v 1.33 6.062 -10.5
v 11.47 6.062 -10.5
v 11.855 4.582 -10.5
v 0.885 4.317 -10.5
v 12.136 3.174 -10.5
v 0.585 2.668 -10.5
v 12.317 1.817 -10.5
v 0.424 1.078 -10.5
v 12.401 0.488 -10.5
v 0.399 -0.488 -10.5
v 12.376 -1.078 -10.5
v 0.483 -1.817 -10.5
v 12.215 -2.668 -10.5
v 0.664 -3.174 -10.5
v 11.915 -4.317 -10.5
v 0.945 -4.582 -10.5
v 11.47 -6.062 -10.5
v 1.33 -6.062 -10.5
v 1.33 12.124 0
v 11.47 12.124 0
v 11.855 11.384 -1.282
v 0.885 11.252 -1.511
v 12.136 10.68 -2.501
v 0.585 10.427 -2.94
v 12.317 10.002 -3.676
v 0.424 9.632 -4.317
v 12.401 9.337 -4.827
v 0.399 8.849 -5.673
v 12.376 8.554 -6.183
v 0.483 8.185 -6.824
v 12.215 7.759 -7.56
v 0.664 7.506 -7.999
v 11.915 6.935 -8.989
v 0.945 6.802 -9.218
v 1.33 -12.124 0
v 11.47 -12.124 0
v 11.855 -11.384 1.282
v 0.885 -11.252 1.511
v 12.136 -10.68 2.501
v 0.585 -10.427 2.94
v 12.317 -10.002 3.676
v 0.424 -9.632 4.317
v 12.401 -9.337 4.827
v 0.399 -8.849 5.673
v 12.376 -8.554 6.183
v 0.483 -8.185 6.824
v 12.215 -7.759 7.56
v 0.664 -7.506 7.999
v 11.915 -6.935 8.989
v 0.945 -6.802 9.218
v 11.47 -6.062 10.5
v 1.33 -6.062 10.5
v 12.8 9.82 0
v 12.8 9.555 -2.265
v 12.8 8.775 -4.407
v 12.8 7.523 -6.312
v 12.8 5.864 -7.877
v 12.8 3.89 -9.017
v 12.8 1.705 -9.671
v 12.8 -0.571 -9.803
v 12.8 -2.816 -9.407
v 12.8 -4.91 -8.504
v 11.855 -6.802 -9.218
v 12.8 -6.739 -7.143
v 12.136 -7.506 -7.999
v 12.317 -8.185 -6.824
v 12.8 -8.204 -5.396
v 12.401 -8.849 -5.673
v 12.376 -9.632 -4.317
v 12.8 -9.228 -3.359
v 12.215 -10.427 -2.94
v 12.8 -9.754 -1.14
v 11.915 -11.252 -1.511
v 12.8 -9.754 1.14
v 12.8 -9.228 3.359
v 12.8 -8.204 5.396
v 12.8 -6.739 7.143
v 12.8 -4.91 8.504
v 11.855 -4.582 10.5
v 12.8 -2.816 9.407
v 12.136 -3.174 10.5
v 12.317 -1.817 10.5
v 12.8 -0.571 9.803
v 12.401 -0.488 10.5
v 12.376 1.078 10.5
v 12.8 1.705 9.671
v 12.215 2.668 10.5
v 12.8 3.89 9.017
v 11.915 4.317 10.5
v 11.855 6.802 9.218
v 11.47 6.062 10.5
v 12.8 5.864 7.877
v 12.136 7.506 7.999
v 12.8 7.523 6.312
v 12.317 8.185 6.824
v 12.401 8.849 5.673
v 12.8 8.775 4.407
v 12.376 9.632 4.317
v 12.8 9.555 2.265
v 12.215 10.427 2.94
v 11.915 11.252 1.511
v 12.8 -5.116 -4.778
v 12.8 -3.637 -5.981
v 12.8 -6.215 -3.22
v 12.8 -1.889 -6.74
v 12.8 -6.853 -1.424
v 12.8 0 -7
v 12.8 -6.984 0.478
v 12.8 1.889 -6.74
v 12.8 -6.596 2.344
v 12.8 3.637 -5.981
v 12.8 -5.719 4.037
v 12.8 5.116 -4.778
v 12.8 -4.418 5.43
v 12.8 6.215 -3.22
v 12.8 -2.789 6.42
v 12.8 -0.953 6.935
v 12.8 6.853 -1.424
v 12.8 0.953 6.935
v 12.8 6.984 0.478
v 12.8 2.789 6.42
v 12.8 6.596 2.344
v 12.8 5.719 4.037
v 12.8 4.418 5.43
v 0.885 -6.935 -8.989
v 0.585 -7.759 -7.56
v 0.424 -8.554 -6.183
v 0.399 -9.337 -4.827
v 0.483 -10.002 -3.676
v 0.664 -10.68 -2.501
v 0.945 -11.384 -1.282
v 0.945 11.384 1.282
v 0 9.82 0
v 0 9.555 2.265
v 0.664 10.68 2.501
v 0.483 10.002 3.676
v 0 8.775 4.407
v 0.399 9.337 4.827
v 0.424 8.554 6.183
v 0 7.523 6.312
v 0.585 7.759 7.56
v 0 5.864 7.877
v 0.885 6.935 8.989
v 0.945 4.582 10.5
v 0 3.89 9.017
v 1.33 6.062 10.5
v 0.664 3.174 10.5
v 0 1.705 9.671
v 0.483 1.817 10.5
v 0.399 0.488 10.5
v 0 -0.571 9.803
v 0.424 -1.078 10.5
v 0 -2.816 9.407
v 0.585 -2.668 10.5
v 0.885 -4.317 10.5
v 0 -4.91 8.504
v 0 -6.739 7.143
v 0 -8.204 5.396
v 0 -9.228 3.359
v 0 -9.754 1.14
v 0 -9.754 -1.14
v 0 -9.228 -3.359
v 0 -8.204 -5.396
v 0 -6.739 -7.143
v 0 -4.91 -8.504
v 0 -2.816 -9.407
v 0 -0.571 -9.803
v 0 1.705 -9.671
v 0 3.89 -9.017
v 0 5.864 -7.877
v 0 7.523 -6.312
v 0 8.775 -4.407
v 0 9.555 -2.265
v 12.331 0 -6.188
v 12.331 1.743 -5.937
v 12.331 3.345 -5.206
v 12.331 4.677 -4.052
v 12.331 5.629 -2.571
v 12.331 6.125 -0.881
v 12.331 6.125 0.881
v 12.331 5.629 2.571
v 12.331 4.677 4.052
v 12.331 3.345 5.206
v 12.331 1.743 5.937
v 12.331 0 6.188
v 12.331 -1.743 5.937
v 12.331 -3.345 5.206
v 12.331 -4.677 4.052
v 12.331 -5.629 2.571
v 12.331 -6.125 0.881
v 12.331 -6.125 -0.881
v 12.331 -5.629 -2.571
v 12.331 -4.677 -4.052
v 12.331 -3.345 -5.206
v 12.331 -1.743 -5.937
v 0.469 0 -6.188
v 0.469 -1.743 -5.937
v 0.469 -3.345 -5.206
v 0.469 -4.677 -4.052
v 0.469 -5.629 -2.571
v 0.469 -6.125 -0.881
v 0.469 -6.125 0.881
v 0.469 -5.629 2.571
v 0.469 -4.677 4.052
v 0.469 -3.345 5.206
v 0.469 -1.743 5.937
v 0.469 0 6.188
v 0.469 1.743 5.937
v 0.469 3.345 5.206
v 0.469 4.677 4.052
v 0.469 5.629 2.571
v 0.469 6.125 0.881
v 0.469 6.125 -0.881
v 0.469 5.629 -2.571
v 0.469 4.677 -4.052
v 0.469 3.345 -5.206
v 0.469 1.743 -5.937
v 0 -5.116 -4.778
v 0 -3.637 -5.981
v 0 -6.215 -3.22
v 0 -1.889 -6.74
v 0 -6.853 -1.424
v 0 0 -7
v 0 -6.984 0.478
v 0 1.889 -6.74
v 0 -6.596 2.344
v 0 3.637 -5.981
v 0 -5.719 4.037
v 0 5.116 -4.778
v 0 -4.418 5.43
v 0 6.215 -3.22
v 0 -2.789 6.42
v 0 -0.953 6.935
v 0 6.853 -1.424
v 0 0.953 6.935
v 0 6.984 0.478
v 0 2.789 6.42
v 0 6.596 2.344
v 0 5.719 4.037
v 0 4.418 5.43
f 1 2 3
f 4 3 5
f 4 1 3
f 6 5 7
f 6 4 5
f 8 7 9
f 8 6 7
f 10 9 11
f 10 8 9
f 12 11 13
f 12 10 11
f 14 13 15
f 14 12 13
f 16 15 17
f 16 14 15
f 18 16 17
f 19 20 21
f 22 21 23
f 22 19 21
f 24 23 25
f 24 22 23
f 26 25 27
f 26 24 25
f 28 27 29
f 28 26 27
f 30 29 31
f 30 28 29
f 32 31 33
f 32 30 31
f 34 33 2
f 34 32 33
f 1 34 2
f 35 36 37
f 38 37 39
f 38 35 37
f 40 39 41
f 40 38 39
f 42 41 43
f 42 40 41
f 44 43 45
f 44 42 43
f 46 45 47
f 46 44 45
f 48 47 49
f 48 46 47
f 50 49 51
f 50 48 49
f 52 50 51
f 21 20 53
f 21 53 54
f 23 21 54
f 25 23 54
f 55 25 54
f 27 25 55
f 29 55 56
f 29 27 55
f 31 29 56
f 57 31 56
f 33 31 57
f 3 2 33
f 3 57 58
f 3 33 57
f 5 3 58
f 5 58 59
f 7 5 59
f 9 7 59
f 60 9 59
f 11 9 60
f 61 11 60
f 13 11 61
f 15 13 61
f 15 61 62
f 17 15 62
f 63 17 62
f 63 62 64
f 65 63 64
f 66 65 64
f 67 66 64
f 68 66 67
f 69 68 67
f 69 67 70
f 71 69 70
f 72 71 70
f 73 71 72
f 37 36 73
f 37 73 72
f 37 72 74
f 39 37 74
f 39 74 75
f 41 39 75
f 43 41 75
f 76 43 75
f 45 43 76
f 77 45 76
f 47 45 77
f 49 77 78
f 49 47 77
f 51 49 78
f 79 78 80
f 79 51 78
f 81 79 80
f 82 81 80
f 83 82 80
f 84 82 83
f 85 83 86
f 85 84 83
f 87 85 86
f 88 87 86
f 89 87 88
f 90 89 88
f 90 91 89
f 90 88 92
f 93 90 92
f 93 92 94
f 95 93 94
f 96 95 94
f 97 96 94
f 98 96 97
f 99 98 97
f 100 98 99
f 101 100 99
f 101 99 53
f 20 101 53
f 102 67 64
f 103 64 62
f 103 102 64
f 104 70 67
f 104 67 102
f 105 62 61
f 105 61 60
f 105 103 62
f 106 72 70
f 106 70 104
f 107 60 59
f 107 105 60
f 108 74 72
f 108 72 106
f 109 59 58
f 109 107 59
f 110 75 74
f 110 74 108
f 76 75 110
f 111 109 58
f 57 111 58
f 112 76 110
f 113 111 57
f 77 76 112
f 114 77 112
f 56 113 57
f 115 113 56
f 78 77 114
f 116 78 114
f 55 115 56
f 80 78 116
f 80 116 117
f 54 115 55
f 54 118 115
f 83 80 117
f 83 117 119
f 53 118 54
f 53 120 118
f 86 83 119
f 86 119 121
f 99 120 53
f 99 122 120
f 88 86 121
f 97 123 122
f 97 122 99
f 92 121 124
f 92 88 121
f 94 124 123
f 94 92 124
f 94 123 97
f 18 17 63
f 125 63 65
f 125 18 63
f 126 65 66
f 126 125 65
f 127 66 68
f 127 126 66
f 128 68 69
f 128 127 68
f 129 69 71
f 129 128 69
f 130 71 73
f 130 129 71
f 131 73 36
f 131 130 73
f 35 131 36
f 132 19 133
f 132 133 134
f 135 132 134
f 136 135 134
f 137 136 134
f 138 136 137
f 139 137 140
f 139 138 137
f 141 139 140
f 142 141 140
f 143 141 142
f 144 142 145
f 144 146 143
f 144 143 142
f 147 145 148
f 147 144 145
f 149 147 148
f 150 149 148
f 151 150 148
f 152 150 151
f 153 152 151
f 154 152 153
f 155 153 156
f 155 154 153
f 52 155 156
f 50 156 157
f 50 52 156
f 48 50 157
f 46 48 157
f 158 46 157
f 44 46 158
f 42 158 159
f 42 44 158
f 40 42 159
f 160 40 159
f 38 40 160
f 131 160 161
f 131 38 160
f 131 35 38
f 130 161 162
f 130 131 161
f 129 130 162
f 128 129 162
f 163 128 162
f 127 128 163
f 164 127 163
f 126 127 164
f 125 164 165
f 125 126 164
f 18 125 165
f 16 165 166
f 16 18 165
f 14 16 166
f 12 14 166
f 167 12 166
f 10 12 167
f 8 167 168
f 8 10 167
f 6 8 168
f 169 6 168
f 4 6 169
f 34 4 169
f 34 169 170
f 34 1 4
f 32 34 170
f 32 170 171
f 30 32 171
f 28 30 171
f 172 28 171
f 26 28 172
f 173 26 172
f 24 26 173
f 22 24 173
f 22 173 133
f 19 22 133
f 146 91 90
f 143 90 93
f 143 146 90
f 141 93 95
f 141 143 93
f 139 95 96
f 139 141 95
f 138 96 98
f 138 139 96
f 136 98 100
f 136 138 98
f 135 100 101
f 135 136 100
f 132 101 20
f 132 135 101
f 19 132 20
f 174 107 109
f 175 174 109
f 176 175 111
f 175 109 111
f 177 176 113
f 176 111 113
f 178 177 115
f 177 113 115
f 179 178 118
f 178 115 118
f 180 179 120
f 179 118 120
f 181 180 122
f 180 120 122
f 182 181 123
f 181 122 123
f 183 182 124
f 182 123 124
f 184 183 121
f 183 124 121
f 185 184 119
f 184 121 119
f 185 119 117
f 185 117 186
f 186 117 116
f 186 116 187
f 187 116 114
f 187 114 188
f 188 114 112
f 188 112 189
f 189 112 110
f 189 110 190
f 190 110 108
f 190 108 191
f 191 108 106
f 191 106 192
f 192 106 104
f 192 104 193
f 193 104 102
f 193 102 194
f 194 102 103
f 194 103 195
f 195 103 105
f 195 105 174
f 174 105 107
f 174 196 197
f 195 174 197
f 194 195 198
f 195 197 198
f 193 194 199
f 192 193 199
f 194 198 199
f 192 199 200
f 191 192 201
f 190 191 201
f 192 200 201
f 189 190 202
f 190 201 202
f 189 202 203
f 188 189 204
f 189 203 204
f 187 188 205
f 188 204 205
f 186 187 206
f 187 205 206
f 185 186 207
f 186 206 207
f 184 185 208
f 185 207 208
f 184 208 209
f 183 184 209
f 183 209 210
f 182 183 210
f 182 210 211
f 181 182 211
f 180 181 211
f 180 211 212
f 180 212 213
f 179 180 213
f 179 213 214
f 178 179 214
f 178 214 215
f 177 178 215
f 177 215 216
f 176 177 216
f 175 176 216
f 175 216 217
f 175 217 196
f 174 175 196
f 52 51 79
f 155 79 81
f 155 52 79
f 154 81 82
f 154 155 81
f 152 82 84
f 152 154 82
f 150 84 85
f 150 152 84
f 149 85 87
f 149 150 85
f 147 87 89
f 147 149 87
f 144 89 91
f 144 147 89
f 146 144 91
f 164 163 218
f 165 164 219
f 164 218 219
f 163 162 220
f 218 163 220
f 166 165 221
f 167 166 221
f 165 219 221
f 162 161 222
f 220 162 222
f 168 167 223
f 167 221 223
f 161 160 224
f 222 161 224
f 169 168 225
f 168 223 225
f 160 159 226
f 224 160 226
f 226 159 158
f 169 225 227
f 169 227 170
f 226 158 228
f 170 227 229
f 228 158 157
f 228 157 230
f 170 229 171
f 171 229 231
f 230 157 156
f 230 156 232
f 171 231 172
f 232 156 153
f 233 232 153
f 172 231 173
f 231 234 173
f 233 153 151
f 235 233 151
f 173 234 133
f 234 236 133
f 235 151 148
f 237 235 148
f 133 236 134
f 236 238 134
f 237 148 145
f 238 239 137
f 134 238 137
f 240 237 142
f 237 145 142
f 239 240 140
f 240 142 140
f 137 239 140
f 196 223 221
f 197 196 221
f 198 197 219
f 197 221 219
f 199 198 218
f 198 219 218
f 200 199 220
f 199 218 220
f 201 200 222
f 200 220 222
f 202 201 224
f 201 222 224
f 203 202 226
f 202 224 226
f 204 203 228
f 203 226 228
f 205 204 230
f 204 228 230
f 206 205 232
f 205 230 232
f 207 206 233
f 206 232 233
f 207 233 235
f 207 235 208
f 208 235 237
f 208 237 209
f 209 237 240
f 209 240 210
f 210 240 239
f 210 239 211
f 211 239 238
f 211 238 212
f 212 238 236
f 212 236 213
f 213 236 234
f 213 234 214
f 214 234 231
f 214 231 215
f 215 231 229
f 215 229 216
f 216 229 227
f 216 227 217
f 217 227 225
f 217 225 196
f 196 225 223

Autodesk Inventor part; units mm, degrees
ref_plane "YZ Plane" through (0, 0, 0) normal (1, 0, 0) x (0, 1, 0)
ref_plane "XZ Plane" through (0, 0, 0) normal (0, 1, 0) x (-1, 0, 0)
sketch "Эскиз1" plane through (0, 0, 0) normal (1, 0, 0) x (0, 1, 0)
  line L0 (-12.1244, 0) -> (-6.0622, 10.5)
  line L1 (-6.0622, 10.5) -> (6.0622, 10.5)
  line L2 (6.0622, 10.5) -> (12.1244, 0)
  line L3 (12.1244, 0) -> (6.0622, -10.5)
  line L4 (6.0622, -10.5) -> (-6.0622, -10.5)
  line L5 (-6.0622, -10.5) -> (-12.1244, 0)
  point P0 (0, 0)
  point P1 (0, 0)
  dimension "d0" = 24.2487
extrude "Базовый элемент" add sketch "Эскиз1" along normal blind 12.8
sketch "Эскиз2" plane through (0, 0, 0) normal (0, 0, 1) x (1, 0, 0)
  line L0 (0, 6.0622) -> (0, 12.1244) projected
  line L1 (0, 12.1244) -> (12.8, 12.1244) projected
  line L2 (12.8, 6.0622) -> (12.8, 12.1244) projected
  line L3 (-2.56, 0) -> (15.36, 0) projected
  line L4 (1.3304, 12.1244) -> (0, 9.82)
  line L5 (11.4696, 12.1244) -> (12.8, 9.82)
  dimension "d3" = 30
  dimension "d4" = 30
  dimension "d5" = 19.64
  dimension "d6" = 19.64
revolve "Фаска1" cut sketch "Эскиз2" angle 360 about axis through (-10, 0, 0) along (1, 0, 0)
sketch "Эскиз3" plane through (12.8, 0, 0) normal (1, 0, 0) x (0, 0, -1)
  arc A0 (-0.625, -1.0825) -> (0.625, -1.0825) centre (0, 0) ccw projected
hole "Резьба" at (12.8, 0, 0) direction (-1, 0, 0) diameter 12.376 end through all thread size "M14x1.5" class "6H" standard "ISO Metric profile"
chamfer "Фаска2" distance 0.8119 angle 30 1 edges at (12.8, 0, 6.188) measured on face at (12.8, 8.4992, -1.032)
chamfer "Фаска3" distance 0.8119 angle 30 1 edges at (0, 0, 6.188) measured on face at (0, 8.4992, -1.032)
ref_plane "Work Plane1" through (-22.0572, 0, 0) normal (0, -0.866, -0.5) x (1, 0, 0)
equation "\"d0\" = 1.1547 * SW"
equation "\"d1\" = KOH"
equation "\"d3\" = ANG1"
equation "\"d4\" = ANG2"
equation "\"d5\" = SW0"
equation "\"d6\" = SW01"
equation "\"d8\" = -0.5 * GD1 + 0.5 * NND"
equation "\"d40\" = -0.5 * GD1 + 0.5 * NND"
equation "\"d10\" = -0.5 * GD1 + 0.5 * NND"
equation "\"d41\" = -0.5 * GD1 + 0.5 * NND"
equation "\"ANG1\" = 30deg"
equation "\"ANG2\" = 30deg"
equation "\"NND\" = 14"
equation "\"KOH\" = 12.8"
equation "\"SW\" = 21"
equation "\"SW0\" = 19.64"
equation "\"SW01\" = SW0"
equation "\"GUL\" = 0.541266 * PTC"
equation "\"LADI\" = 19.64"
equation "\"TOA\" = 30deg"
equation "\"FAWI\" = 30deg"
equation "\"PTC\" = 1.5"
equation "\"THREADDIA\" = 14"
equation "\"E0\" = 1.155 * SW"
equation "\"GAL\" = 0.541266 * PTC"
equation "\"GD1\" = 12.376202"
properties part number "Копия гайки M14x1,5-6H ГОСТ 5915-70" material "Сталь, мягкая"
